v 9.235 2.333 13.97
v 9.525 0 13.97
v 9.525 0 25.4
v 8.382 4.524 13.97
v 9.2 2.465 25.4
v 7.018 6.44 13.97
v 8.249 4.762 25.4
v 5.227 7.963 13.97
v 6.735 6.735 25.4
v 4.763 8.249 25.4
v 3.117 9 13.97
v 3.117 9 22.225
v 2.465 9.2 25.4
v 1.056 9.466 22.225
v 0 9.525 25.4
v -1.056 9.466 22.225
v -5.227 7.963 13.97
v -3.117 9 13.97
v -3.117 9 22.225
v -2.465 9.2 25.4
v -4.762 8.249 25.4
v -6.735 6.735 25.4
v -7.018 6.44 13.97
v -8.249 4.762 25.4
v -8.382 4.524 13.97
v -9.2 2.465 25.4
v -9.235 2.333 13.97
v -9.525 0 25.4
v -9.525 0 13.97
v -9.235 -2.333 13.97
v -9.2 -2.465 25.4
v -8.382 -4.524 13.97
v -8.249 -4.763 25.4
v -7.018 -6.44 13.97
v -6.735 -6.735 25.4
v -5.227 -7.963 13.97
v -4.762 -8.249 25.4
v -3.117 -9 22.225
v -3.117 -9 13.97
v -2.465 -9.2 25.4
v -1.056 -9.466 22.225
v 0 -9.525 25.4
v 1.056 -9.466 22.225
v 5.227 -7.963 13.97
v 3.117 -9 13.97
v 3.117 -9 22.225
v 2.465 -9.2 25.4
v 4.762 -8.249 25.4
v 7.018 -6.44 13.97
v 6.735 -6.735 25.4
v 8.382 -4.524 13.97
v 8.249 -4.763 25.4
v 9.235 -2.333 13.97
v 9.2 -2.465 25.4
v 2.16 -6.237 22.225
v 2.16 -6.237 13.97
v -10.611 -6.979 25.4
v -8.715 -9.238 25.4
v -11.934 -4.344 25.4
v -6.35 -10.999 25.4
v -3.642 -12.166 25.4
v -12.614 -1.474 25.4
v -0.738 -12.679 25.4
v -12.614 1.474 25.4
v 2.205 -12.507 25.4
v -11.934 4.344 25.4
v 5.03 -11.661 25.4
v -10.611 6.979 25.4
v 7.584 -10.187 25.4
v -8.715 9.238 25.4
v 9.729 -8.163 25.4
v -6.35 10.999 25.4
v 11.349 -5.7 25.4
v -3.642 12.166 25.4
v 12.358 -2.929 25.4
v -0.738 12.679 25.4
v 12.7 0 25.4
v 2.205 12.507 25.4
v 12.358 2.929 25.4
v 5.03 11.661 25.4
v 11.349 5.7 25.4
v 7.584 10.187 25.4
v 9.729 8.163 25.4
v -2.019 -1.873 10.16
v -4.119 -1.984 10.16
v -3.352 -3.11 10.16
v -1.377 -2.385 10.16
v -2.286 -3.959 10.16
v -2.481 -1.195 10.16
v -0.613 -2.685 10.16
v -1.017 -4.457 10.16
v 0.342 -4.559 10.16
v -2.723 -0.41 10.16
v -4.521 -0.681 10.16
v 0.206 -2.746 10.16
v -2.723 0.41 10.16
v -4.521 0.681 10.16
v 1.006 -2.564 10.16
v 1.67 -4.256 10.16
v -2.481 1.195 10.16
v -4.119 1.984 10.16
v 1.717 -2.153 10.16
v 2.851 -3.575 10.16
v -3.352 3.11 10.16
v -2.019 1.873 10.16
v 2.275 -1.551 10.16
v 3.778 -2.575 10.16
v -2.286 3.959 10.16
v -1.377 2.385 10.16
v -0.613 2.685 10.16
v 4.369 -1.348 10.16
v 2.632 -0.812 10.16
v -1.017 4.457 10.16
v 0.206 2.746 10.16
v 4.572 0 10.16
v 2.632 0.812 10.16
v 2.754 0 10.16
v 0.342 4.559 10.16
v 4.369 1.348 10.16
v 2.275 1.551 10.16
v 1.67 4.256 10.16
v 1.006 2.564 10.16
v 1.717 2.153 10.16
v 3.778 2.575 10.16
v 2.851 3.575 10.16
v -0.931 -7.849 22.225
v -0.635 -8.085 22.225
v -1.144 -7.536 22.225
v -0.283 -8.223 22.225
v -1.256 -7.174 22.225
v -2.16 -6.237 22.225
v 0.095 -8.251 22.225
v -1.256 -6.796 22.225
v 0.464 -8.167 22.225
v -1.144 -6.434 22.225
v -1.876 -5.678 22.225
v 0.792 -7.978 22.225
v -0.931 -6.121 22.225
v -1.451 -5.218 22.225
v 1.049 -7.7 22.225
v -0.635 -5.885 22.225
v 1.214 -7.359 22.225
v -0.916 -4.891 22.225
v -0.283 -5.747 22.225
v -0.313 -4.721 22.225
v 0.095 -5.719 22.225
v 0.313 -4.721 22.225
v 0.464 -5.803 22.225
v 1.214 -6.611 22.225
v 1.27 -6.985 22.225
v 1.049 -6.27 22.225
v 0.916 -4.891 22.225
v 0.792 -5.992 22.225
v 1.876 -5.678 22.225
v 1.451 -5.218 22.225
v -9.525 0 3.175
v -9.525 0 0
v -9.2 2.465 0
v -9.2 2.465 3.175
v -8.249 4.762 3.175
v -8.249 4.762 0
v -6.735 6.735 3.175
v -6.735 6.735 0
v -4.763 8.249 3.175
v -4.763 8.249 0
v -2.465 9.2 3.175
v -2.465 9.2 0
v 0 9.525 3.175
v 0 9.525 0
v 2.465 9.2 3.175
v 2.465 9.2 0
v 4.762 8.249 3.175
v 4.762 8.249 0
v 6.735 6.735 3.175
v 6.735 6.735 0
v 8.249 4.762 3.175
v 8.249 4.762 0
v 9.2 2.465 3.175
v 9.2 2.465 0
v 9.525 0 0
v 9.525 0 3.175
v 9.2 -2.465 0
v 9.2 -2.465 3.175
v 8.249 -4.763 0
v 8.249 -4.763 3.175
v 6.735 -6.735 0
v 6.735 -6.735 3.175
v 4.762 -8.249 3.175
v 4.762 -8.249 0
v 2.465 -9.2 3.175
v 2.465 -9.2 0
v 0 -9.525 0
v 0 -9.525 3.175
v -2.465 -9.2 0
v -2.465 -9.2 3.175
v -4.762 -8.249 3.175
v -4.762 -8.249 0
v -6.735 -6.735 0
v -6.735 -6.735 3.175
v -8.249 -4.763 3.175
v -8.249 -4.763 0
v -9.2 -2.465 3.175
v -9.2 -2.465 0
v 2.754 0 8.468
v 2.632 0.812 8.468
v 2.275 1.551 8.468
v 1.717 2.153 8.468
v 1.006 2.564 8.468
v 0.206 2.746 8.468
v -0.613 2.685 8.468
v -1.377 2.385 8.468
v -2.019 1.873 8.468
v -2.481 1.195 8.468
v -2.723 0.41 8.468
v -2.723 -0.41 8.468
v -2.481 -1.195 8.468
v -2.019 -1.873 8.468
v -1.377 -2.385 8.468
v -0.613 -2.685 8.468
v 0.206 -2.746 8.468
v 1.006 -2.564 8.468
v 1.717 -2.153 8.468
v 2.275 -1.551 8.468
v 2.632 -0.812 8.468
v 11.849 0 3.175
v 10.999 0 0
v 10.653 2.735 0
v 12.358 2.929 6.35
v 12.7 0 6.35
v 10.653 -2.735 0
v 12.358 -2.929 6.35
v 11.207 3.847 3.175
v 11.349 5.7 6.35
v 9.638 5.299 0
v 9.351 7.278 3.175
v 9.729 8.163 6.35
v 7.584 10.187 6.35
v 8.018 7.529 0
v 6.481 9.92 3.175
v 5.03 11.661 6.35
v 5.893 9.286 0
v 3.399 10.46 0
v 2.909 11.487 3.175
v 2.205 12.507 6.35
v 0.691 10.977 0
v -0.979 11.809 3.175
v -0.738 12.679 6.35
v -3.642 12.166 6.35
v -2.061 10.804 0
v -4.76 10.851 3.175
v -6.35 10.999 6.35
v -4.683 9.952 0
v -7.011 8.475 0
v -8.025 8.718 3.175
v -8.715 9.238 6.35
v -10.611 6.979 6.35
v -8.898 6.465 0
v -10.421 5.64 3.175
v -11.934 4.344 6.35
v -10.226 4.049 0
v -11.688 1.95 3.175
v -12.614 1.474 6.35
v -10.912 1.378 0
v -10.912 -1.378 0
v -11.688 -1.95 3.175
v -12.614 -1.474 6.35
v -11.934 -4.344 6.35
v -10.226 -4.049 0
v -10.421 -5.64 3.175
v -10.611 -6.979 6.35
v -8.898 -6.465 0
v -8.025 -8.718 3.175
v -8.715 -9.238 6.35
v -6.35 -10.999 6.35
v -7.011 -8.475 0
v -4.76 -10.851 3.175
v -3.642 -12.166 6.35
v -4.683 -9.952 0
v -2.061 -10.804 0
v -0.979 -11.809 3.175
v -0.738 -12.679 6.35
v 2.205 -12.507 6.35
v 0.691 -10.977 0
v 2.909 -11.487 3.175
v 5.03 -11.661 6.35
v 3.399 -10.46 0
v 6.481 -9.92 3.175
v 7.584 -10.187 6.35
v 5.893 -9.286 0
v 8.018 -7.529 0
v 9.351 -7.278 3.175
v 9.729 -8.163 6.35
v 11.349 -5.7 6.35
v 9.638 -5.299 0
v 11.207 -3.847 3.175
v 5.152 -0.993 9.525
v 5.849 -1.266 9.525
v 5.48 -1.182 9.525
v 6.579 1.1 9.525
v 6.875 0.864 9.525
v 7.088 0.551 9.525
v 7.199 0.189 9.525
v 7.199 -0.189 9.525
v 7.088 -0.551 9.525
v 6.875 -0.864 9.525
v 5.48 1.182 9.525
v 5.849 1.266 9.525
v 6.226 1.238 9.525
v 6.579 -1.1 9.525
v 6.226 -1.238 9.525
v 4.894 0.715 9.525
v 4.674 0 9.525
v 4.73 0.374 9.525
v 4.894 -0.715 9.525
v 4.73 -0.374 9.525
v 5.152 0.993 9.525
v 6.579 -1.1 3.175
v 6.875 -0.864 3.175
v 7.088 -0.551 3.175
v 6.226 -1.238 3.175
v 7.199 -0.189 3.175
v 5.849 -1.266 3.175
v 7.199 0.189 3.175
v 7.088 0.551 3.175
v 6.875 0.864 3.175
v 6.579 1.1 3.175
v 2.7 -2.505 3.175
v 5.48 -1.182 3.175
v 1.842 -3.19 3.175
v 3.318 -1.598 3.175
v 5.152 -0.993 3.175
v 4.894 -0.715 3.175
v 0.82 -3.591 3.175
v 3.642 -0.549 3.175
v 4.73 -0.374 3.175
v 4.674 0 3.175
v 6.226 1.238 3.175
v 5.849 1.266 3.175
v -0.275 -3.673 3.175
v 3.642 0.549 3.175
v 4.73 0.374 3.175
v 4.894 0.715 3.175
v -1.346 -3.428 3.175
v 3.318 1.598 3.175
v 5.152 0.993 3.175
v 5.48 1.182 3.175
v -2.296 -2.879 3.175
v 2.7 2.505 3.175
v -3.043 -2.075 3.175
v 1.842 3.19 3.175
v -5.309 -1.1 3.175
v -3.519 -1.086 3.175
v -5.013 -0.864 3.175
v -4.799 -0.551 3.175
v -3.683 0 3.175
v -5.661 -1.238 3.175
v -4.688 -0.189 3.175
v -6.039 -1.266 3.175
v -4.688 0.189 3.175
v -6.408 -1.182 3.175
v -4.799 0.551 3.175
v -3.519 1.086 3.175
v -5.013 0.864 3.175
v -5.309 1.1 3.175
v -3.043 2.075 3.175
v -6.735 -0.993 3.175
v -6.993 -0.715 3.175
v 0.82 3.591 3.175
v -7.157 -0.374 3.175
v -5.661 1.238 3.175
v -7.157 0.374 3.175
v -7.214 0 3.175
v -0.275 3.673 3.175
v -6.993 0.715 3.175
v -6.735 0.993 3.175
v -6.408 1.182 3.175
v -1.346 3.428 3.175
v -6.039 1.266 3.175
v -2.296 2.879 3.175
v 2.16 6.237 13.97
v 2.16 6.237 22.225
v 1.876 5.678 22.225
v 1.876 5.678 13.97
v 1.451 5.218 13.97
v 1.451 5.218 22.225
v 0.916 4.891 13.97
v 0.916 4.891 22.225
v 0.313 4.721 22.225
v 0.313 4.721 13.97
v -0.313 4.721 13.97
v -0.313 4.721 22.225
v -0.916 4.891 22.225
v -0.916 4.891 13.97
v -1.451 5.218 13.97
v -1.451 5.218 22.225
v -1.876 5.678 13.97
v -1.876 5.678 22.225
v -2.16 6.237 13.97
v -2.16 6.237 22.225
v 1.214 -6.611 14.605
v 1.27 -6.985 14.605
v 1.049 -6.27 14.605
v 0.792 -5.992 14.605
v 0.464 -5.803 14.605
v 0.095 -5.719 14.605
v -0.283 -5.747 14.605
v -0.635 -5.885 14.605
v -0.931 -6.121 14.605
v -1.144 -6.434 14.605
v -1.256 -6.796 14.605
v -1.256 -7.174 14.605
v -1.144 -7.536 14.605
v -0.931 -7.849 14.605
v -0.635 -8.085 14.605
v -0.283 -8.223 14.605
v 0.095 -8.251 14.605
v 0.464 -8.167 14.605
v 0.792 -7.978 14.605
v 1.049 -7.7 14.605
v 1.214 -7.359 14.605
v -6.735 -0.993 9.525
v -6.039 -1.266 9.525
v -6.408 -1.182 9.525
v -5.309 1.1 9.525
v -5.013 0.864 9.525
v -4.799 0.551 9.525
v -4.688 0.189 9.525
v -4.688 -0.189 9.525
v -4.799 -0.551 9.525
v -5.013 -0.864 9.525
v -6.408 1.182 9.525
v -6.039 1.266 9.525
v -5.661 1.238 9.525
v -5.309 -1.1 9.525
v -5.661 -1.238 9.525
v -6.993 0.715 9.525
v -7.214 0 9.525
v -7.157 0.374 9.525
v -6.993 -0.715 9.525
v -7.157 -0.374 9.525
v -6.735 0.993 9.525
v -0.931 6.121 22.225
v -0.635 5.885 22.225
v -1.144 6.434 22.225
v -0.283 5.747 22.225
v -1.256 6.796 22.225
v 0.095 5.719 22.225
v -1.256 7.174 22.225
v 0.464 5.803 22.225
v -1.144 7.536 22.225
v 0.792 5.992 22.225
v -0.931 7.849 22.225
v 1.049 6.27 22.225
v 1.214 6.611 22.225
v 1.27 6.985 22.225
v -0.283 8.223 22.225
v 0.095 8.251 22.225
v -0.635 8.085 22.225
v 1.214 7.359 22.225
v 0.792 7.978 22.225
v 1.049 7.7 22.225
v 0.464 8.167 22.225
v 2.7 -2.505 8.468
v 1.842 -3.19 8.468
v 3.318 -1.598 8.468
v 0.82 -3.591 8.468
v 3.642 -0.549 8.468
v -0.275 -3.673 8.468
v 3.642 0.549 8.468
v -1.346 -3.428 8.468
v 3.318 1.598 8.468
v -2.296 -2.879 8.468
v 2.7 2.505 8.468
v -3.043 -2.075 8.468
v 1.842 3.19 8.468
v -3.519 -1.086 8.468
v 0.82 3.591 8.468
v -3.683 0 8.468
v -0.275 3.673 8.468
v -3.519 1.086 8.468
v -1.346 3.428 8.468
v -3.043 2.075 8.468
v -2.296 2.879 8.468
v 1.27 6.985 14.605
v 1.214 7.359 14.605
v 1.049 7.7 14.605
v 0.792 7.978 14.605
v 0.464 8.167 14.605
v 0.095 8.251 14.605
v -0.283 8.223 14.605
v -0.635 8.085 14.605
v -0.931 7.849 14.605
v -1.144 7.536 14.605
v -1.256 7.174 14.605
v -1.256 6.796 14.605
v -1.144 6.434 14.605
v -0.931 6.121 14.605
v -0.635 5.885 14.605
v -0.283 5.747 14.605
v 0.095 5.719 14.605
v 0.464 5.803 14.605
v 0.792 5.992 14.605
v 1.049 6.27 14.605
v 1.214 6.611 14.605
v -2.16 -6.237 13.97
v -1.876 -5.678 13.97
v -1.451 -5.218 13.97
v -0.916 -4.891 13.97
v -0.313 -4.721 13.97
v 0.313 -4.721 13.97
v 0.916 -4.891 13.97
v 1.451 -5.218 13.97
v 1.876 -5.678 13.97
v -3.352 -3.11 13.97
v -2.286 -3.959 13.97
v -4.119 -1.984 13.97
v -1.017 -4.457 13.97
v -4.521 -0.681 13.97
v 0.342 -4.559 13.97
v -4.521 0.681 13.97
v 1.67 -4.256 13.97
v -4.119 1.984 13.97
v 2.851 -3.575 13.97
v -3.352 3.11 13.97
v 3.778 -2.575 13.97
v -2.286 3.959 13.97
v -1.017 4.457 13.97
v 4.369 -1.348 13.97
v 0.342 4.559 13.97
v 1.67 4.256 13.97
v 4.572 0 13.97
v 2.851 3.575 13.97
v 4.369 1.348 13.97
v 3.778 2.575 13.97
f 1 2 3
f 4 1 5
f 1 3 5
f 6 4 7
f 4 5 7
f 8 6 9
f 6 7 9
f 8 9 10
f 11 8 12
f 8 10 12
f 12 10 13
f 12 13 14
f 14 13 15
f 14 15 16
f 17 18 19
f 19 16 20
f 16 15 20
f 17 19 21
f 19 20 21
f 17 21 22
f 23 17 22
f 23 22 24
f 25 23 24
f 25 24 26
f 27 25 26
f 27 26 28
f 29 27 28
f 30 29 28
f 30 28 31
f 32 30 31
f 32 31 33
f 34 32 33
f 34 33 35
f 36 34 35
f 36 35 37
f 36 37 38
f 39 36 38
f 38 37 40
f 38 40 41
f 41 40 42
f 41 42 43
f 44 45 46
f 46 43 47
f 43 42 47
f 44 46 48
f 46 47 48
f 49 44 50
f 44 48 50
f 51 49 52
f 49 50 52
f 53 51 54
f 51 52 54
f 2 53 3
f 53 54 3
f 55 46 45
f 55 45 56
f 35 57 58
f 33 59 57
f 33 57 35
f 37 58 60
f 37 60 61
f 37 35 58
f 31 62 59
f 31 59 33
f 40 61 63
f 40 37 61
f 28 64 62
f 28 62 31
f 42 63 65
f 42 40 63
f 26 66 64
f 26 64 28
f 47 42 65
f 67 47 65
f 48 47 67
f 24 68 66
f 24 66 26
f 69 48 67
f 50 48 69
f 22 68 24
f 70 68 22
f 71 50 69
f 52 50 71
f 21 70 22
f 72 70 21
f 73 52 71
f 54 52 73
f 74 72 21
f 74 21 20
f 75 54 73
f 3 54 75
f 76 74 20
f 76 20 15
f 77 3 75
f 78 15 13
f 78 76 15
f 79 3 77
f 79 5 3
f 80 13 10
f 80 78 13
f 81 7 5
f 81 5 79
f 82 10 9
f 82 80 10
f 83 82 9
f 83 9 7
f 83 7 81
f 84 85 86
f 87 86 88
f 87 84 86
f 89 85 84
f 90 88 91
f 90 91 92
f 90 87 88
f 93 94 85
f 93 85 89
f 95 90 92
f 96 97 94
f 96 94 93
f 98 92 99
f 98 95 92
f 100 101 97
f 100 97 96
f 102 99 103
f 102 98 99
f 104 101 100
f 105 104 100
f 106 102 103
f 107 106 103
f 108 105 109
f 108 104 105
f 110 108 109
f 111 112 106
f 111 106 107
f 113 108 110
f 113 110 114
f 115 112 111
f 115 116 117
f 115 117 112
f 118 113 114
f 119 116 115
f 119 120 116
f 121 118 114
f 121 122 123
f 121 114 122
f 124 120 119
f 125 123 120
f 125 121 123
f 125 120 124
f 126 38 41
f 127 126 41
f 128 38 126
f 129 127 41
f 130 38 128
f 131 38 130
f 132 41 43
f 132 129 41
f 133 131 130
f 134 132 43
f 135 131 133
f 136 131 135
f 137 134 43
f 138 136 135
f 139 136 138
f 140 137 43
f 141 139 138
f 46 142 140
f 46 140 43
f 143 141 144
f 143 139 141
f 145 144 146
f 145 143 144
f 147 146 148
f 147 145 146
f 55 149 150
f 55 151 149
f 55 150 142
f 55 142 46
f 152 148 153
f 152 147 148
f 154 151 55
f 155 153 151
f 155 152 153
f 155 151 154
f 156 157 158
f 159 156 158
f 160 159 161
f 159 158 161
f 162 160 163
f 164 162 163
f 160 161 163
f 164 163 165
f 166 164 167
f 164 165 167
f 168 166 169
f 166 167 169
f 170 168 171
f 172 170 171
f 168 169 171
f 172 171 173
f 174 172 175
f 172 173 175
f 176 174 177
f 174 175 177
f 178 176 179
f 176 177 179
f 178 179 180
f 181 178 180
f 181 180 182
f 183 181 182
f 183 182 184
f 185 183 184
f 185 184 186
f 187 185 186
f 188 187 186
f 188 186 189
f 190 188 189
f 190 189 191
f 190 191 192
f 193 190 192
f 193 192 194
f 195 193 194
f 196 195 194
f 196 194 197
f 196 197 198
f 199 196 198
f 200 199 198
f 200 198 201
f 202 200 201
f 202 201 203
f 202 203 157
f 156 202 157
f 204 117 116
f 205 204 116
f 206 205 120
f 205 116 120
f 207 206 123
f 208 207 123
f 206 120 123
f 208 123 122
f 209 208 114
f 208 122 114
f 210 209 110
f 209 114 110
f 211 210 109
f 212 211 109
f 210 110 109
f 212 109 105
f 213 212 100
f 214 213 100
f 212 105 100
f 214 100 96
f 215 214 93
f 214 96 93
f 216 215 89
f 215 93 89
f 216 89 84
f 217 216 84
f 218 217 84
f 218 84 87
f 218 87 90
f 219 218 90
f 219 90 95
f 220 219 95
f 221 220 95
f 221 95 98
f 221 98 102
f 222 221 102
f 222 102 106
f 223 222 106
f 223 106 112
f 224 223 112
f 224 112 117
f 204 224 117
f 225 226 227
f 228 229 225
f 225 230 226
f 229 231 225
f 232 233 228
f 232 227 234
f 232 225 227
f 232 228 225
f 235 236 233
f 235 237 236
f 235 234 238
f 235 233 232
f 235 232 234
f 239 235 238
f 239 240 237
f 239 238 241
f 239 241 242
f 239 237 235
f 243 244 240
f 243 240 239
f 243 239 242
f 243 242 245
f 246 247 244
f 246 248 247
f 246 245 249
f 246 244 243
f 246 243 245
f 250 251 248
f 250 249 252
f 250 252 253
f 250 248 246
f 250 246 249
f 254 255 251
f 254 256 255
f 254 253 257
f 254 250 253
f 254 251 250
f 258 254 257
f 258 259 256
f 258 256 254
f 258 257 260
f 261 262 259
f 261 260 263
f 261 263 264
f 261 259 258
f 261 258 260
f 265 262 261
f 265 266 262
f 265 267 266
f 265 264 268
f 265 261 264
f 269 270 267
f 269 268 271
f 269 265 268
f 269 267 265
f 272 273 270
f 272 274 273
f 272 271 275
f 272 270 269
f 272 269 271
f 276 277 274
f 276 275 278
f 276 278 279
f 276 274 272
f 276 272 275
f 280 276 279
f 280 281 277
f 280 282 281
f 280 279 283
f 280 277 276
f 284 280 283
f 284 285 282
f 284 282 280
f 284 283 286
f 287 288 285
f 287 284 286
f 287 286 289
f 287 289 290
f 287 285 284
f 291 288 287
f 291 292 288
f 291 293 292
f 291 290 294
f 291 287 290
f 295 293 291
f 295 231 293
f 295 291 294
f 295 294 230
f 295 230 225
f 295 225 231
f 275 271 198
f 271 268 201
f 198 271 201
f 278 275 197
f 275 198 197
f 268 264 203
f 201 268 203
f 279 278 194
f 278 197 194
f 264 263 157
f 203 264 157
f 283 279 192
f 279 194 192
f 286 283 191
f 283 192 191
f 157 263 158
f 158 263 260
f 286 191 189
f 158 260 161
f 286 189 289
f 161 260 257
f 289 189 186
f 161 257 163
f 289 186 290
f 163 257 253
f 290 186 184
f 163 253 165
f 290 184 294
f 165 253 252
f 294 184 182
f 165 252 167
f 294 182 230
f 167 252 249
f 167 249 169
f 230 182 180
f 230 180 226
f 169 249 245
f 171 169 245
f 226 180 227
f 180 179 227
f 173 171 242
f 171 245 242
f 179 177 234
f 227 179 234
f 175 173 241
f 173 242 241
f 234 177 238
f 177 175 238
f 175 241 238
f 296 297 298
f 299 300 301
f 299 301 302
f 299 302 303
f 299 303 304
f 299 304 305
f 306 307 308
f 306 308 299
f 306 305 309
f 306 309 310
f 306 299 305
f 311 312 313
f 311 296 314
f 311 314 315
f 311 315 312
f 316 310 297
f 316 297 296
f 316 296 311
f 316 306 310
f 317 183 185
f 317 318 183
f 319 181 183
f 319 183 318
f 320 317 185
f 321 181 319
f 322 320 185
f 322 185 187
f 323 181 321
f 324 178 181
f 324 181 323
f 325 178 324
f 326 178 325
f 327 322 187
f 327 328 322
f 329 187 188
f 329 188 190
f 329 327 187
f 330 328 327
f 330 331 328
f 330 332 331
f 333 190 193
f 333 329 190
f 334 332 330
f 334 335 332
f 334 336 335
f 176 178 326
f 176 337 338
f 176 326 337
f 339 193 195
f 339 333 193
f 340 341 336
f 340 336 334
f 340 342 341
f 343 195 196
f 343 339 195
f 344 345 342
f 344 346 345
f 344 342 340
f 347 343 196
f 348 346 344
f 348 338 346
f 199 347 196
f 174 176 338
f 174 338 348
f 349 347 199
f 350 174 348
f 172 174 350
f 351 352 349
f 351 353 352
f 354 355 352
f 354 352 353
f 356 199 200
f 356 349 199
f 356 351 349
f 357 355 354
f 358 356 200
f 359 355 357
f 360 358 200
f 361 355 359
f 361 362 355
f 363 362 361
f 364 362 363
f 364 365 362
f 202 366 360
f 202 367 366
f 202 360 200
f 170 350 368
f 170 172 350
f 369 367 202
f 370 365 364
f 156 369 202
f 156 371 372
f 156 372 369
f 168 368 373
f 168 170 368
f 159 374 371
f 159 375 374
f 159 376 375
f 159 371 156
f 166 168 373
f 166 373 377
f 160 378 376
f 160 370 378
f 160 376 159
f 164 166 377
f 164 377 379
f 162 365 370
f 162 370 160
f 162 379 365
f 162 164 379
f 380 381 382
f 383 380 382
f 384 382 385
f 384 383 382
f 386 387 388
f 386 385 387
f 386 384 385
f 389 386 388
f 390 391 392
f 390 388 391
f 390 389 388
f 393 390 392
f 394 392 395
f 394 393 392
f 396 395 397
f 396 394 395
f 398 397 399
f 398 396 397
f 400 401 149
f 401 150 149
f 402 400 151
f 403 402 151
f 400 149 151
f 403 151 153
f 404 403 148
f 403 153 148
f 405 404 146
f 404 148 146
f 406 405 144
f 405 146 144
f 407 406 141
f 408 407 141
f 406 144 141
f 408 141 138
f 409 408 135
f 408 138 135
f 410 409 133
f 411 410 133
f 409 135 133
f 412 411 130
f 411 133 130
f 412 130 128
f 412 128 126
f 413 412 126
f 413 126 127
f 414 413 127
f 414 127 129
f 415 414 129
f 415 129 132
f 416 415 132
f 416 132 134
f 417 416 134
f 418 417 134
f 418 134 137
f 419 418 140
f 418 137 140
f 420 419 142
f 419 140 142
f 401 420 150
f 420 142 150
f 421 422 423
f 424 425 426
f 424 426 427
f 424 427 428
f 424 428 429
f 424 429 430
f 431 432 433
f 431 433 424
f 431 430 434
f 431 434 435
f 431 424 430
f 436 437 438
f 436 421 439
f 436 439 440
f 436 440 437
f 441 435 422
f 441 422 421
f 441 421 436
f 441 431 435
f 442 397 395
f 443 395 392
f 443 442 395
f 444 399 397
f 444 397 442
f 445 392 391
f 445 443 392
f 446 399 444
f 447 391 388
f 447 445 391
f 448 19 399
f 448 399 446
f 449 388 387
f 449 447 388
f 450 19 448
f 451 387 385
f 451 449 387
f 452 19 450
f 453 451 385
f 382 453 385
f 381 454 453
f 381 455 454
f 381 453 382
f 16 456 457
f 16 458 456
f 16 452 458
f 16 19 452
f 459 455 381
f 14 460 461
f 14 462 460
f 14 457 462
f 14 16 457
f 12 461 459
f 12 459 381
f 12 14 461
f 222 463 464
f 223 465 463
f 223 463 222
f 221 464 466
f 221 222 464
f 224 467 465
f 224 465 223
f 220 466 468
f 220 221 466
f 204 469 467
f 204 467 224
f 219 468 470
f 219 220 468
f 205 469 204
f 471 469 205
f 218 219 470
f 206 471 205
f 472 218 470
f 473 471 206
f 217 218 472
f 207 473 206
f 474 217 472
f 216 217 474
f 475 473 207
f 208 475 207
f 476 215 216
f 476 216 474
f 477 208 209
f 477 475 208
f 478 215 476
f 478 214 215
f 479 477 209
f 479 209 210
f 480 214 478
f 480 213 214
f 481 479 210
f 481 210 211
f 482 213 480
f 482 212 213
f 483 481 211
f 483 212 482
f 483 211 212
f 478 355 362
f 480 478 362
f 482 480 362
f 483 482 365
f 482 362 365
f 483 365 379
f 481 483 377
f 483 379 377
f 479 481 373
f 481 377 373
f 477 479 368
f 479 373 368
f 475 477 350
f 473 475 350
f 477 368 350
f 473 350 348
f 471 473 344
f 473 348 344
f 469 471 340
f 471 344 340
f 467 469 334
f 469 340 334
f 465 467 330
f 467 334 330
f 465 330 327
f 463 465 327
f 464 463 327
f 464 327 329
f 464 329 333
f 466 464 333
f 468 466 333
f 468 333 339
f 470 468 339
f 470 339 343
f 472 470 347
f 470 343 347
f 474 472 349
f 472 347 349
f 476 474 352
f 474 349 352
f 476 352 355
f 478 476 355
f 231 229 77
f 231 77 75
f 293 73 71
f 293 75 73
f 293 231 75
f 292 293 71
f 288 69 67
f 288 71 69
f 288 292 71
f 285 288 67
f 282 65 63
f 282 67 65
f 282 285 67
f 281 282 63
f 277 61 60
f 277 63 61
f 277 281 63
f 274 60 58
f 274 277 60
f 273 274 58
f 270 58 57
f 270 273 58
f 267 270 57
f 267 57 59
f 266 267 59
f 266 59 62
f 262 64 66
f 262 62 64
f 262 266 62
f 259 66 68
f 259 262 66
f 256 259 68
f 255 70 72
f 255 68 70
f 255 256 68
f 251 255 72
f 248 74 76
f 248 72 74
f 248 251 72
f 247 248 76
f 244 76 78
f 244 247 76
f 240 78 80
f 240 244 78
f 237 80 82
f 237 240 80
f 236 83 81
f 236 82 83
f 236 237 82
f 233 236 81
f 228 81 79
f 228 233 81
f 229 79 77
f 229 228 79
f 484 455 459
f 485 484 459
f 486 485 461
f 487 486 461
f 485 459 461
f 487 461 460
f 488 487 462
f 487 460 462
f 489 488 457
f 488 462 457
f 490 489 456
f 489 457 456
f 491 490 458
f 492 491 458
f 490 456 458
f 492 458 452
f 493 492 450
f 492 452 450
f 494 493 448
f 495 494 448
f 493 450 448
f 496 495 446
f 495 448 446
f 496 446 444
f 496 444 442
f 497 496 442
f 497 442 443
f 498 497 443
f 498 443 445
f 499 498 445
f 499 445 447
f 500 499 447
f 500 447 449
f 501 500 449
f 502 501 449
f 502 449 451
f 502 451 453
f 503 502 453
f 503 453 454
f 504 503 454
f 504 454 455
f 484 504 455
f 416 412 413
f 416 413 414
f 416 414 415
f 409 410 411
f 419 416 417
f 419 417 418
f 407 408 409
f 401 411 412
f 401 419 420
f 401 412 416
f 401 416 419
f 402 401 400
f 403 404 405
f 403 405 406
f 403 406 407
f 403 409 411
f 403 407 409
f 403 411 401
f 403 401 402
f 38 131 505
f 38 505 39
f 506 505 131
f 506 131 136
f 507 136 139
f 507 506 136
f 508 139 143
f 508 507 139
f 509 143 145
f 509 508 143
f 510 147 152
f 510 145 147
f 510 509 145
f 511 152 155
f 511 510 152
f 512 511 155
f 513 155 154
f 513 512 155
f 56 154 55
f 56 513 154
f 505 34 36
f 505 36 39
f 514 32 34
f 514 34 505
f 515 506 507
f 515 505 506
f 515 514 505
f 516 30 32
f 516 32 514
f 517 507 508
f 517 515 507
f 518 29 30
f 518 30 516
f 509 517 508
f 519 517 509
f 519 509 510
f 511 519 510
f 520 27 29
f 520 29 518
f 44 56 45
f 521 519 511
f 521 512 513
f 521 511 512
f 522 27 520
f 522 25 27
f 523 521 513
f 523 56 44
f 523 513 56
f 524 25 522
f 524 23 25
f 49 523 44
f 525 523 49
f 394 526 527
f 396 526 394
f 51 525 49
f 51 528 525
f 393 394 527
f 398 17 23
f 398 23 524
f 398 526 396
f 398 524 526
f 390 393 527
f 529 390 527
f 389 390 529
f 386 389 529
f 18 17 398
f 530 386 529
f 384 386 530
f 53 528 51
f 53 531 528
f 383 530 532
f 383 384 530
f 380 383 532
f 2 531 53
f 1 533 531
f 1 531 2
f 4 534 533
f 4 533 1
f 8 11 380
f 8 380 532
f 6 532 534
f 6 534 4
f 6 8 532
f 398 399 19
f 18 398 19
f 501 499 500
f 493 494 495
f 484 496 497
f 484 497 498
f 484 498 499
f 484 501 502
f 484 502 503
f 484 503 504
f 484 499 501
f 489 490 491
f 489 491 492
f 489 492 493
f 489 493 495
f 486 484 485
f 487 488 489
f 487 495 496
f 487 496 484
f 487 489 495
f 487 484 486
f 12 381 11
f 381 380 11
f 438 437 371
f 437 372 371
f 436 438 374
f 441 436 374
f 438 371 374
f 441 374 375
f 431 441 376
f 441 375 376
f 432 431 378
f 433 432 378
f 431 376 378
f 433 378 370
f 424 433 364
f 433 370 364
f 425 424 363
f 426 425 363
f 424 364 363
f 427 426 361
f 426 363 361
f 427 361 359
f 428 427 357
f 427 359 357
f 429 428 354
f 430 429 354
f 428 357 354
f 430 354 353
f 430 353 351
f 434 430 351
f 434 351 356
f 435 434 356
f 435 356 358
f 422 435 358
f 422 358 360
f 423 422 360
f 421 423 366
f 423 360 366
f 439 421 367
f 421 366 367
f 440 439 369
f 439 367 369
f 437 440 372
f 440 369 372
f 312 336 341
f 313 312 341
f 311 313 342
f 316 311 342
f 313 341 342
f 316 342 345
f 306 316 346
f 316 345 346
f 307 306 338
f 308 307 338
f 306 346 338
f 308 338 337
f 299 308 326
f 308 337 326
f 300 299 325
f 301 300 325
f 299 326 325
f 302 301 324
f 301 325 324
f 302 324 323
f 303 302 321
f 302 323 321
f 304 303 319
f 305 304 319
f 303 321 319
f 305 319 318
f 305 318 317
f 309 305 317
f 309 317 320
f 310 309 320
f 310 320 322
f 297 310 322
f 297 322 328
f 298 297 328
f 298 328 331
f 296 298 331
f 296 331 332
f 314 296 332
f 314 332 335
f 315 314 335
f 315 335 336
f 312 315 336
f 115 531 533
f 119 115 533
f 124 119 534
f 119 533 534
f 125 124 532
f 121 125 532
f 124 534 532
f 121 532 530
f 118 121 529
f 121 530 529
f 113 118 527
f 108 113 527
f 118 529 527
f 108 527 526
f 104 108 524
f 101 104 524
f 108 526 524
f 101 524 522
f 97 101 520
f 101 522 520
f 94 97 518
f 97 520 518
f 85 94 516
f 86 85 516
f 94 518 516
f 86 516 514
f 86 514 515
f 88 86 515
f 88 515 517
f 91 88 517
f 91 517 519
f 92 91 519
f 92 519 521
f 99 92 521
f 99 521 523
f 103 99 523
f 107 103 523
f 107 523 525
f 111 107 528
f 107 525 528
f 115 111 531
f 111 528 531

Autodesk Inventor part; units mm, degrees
ref_plane "YZ Plane" through (0, 0, 0) normal (1, 0, 0) x (0, 1, 0)
ref_plane "XZ Plane" through (0, 0, 0) normal (0, 1, 0) x (-1, 0, 0)
ref_plane "XY Plane" through (0, 0, 0) normal (0, 0, 1) x (1, 0, 0)
sketch "Sketch1" plane through (0, 0, 0) normal (0, 0, 1) x (1, 0, 0)
  circle A0 centre (0, 0) radius 12.7
  dimension "d0" = 25.4
extrude "Extrusion1" add sketch "Sketch1" along normal blind 25.4
sketch "Sketch3" plane through (0, 0, 0) normal (0, 0, -1) x (-1, 0, 0)
  circle A0 centre (0, 0) radius 9.525
  dimension "d6" = 19.05
extrude "Extrusion3" cut sketch "Sketch3" against normal blind 3.175
sketch "Sketch4" plane through (0, 0, 3.175) normal (0, 0, -1) x (-1, 0, 0)
  circle A0 centre (0, 0) radius 3.683
  circle A1 centre (0, 0) radius 9.525 projected
  arc A2 (-3.175, 8.9803) -> (3.175, 8.9803) centre (0, 0) ccw projected
  dimension "d40" = 7.366
extrude "Extrusion4" cut sketch "Sketch4" against normal blind 5.2926 contours A0
sketch "Sketch5" plane through (0, 0, 25.4) normal (0, 0, 1) x (1, 0, 0)
  circle A0 centre (0, 0) radius 9.525
  dimension "d13" = 19.05
extrude "Extrusion5" cut sketch "Sketch5" against normal blind 11.43
sketch "Sketch7" plane through (0, 0, 13.97) normal (0, 0, 1) x (1, 0, 0)
  circle A0 centre (0, 0) radius 3.683 projected
  circle A1 centre (-4.7625, 0) radius 3.429 projected
  circle A2 centre (-4.7625, 0) radius 1.6433
  circle A3 centre (0, 0) radius 4.572
  dimension "d47" = 9.144
extrude "Extrusion8" cut sketch "Sketch7" against normal blind 3.81 contours A0 A1 | A0 A1 A3 | A1 A0 A2 | A0 A2 A3 A1 | A1 A3 A2 A0 | A2 A0 | A0 A2 A3
sketch "Sketch8" plane through (0, 0, 10.16) normal (0, 0, 1) x (1, 0, 0)
  circle A0 centre (0, 0) radius 2.754
extrude "Extrusion9" cut sketch "Sketch8" against normal through all
sketch "Sketch9" plane through (0, 0, 13.97) normal (0, 0, 1) x (1, 0, 0)
  circle A0 centre (0, -6.985) radius 2.286 projected
  circle A1 centre (0, 6.985) radius 2.286 projected
  circle A2 centre (0, 0) radius 9.525 projected
  line L0 (-2.1601, -6.2369) -> (-3.1173, -9.0005)
  line L1 (-2.1601, 6.2369) -> (-3.1173, 9.0005)
  line L2 (3.1173, -9.0005) -> (2.1601, -6.2369)
  line L3 (2.1601, 6.2369) -> (3.1173, 9.0005)
extrude "Extrusion10" add sketch "Sketch9" along normal blind 8.255 contours A0 | A0 L2 A2 L0 | A2 L3 A1 L1 | A1
sketch "Sketch10" plane through (0, 0, 22.225) normal (0, 0, 1) x (1, 0, 0)
  circle A0 centre (0, -6.985) radius 1.27
  circle A1 centre (0, 6.985) radius 1.27
  circle A2 centre (0, -6.985) radius 2.286 projected
  circle A3 centre (0, 6.985) radius 2.286 projected
  point P0 (0, 0)
  dimension "d28" = 2.54
  dimension "d29" = 2.54
extrude "Extrusion11" cut sketch "Sketch10" against normal blind 7.62 contours A0 | A1
chamfer "Chamfer1" distance 6.35 angle 15 1 edges at (-12.7, 0, 0) measured on face at (12.6588, -1.0219, 16.9333)
sketch "Sketch12" plane through (0, 0, 3.175) normal (0, 0, -1) x (-1, 0, 0)
  circle A0 centre (5.9436, 0) radius 1.27
  circle A1 centre (-5.9436, 0) radius 1.27
  point P0 (0, 0)
  dimension "d41" = 2.54
  dimension "d42" = 2.54
  dimension "d43" = 5.9436
  dimension "d44" = 5.9436
extrude "Extrusion13" cut sketch "Sketch12" against normal blind 6.35
properties part number "Cap no LED"
